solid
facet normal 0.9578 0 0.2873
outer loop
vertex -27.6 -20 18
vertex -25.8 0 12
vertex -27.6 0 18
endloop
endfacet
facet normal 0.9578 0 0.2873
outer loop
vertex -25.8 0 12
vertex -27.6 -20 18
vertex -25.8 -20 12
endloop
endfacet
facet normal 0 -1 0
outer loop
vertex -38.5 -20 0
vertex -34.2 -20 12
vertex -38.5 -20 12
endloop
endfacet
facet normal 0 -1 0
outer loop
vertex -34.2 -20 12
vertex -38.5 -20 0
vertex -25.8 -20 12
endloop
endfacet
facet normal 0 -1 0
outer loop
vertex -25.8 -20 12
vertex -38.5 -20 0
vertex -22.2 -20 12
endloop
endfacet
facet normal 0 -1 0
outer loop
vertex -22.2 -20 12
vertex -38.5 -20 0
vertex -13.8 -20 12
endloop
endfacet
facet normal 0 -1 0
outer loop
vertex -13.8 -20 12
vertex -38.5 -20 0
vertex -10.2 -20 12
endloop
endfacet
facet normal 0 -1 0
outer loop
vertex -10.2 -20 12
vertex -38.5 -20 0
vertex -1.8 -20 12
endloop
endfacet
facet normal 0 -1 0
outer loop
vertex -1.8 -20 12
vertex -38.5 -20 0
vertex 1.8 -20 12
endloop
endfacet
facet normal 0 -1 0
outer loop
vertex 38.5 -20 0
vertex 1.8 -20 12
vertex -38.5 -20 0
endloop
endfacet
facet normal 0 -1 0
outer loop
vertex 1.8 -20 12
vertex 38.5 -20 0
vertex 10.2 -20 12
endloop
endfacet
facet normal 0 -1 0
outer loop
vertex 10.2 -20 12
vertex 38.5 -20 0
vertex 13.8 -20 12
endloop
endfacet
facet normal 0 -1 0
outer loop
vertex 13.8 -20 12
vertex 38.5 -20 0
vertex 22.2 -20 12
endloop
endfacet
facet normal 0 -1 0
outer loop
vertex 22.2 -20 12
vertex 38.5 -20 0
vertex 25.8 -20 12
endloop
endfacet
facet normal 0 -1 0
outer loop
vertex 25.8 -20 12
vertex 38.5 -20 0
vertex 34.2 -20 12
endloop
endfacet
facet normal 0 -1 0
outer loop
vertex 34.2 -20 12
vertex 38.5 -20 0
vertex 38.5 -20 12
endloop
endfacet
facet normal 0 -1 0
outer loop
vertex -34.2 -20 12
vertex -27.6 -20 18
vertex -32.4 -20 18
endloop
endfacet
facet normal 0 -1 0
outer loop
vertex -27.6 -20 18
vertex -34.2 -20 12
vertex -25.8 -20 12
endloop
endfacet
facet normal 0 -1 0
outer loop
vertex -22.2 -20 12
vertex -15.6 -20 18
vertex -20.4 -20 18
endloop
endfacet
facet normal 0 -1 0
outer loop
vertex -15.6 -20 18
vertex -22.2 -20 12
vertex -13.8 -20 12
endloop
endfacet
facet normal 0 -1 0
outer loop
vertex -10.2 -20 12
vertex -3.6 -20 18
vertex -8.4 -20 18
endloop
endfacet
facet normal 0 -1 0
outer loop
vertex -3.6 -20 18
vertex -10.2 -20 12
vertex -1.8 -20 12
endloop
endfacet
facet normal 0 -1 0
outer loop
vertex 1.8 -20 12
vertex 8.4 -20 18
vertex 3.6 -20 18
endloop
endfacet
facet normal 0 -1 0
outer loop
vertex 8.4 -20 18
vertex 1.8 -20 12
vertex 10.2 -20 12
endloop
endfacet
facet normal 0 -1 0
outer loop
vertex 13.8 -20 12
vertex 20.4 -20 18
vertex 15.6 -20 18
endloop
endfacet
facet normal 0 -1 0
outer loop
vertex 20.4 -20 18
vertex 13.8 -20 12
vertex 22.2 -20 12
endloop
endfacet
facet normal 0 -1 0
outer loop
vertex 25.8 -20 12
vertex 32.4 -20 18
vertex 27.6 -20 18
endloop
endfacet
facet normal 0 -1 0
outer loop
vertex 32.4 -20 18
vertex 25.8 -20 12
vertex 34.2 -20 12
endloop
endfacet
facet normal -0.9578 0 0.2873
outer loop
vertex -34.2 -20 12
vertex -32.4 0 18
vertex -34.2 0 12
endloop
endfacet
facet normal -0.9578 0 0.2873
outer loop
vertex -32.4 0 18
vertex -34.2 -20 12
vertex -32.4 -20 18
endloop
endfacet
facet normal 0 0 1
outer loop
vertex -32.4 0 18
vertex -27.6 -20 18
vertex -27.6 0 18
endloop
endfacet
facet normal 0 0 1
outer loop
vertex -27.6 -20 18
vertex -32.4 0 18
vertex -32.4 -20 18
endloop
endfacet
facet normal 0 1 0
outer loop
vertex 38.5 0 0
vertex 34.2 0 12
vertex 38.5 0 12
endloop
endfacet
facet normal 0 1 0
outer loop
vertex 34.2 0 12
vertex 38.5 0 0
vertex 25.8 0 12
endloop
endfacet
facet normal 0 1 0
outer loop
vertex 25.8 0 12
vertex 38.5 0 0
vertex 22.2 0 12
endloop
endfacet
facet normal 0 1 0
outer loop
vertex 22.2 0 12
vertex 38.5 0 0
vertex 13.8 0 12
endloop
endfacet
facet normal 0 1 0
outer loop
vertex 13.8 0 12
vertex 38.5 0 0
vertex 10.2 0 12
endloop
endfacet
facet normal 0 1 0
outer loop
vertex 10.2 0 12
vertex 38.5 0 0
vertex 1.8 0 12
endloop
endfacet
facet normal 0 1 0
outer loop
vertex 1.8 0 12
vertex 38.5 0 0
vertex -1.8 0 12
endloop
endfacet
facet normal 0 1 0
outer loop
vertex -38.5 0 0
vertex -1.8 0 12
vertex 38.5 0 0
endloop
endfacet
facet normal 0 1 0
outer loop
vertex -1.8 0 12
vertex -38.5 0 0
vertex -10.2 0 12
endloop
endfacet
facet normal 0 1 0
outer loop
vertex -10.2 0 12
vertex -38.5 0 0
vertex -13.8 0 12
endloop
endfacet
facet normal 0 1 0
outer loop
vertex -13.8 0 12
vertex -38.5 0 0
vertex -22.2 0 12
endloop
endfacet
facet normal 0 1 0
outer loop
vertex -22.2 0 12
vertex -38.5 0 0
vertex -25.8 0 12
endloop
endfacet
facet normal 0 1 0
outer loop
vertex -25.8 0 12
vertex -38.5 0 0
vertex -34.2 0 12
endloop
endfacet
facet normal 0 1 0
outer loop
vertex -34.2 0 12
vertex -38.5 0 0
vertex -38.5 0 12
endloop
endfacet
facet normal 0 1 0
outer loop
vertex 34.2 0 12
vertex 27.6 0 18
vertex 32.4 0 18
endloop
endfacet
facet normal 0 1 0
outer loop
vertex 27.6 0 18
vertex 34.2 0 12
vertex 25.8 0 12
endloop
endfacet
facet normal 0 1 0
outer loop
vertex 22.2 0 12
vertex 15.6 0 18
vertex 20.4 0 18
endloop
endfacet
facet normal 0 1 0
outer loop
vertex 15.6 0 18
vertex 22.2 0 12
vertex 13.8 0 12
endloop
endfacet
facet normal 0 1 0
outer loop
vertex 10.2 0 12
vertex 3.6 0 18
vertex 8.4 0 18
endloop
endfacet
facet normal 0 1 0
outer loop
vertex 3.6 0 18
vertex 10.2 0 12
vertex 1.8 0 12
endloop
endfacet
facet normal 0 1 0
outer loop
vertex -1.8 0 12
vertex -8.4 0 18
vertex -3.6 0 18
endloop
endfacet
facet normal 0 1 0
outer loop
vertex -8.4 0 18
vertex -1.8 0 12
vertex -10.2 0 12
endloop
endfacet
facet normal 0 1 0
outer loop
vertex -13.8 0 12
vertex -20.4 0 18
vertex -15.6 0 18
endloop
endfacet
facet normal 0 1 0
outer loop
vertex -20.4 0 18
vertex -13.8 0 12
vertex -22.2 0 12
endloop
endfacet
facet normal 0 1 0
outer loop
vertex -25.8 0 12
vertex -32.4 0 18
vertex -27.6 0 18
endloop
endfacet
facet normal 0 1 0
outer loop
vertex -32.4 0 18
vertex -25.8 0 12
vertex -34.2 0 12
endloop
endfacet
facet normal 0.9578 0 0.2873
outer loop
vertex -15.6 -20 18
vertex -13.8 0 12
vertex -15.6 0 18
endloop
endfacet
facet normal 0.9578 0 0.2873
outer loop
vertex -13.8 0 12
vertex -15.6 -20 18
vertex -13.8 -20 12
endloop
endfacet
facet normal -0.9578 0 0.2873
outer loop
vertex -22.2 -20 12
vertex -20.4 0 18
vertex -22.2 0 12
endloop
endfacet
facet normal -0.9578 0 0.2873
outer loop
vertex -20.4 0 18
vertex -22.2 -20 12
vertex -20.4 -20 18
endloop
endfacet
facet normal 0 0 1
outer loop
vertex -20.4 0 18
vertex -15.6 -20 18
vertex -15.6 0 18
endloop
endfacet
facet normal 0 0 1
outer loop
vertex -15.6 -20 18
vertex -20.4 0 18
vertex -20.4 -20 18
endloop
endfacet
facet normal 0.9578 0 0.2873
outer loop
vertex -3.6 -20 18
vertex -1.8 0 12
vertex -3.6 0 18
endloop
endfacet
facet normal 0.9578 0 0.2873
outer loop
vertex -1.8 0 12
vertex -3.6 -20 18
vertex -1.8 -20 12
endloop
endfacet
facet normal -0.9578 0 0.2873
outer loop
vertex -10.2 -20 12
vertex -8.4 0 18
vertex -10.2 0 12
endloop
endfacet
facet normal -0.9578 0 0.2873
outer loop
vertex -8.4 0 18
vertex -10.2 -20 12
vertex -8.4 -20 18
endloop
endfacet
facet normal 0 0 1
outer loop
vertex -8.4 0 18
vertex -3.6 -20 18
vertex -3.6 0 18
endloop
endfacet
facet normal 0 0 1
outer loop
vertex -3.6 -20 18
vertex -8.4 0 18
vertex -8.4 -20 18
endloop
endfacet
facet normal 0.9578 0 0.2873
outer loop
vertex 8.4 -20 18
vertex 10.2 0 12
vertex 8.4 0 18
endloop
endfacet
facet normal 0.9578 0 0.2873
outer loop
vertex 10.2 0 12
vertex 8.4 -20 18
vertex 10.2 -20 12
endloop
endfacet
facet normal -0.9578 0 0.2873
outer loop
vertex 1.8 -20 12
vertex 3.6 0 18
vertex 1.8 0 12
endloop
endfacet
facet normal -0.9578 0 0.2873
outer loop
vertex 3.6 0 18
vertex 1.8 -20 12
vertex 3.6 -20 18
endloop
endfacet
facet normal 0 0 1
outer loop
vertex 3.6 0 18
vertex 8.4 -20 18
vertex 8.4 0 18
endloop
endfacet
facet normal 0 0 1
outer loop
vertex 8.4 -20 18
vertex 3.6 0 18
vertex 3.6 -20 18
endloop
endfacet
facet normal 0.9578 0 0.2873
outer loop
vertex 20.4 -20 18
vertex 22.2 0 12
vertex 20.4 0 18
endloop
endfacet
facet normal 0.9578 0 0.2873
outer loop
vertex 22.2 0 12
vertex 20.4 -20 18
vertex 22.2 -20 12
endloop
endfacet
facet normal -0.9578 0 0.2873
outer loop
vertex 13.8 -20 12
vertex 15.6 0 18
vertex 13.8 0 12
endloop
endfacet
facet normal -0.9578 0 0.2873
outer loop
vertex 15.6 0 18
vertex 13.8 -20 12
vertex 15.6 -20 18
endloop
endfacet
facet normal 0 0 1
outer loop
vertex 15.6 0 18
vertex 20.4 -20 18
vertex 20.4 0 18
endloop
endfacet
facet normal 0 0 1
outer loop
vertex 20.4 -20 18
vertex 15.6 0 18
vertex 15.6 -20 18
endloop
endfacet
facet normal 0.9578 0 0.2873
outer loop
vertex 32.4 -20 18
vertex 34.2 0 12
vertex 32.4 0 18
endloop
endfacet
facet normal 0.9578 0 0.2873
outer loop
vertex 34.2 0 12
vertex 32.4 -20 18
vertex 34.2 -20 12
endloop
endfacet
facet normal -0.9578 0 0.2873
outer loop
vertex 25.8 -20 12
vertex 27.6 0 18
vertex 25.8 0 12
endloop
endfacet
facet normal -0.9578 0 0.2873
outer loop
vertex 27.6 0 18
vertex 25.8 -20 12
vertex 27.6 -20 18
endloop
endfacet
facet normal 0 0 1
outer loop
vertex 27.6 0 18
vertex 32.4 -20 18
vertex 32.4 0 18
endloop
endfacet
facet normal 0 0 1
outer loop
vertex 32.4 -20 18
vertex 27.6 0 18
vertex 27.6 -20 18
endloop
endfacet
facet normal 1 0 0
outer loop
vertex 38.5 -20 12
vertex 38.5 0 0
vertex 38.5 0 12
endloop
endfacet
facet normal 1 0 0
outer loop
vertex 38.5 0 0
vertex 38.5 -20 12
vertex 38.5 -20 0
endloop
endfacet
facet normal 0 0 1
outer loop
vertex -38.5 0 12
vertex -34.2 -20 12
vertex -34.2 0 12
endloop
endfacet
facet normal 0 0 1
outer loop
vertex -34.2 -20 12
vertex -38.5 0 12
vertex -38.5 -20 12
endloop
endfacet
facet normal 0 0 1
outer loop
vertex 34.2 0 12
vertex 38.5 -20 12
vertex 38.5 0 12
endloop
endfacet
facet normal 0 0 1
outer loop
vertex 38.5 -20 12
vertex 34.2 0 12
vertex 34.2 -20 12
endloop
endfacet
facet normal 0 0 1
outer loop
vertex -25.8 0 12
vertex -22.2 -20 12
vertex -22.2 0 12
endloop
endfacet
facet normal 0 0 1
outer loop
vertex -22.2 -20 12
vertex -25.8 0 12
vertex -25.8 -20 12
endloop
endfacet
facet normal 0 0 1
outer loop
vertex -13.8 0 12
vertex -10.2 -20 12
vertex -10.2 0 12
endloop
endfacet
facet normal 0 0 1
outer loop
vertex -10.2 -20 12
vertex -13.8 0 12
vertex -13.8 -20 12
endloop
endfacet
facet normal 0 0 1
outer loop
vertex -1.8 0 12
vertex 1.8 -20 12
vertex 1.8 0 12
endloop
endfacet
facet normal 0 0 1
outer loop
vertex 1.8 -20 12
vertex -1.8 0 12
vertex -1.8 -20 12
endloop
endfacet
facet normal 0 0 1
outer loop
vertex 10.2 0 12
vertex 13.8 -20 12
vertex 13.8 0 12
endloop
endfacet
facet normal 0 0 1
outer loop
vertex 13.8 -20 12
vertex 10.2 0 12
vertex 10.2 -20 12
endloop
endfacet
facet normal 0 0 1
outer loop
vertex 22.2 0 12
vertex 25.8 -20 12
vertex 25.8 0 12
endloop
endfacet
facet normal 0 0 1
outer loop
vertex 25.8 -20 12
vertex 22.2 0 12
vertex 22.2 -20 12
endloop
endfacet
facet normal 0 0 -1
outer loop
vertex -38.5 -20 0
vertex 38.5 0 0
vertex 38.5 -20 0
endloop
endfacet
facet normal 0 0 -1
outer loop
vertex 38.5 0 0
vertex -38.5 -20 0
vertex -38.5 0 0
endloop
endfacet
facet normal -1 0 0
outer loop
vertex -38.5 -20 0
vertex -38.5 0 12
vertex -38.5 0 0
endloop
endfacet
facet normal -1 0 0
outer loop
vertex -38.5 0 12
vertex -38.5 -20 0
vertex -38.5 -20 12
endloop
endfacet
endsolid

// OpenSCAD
$fn = 32;

// ----------------------------------------------------------------------
// Toothed rack, 6 teeth
// 12 mm pitch, 6 mm teeth
// ----------------------------------------------------------------------

// --- parameters (mm) ---
bar_w = 20;      // bar width (Y)
seat_tol = 0.1;  // tolerance at the seating features
free_tol = 0.3;  // general tolerance on the free sizes
bar_h = 12;      // bar height (Z)
teeth = 6;       // number of teeth
pitch = 12;      // tooth pitch
tooth_h = 6;     // tooth height above the bar
root_w = 9;      // tooth width at the root
crest_w = 4.8;   // tooth width at the crest

// --- derived feature positions (mm) ---
span = (teeth - 1) * pitch;  // = 60   distance between the outer teeth
bar_l = span + root_w + 8;   // = 77   bar length: teeth plus 4 mm at each end
tooth_x = -span / 2;         // = -30   X of the first tooth
height = bar_h + tooth_h;    // = 18   overall height
feature_centers = [
  [tooth_x + 0 * pitch, -bar_w / 2],
  [tooth_x + 1 * pitch, -bar_w / 2],
  [tooth_x + 2 * pitch, -bar_w / 2],
  [tooth_x + 3 * pitch, -bar_w / 2],
  [tooth_x + 4 * pitch, -bar_w / 2],
  [tooth_x + 5 * pitch, -bar_w / 2]
];   // tooth centre line, drives the tooth loop

// bar with a rack of teeth, one extruded trapezoium per centre
module rack_tooth() {
  linear_extrude(height = bar_w)
    polygon(points = [
      [0, 0],
      [root_w, 0],
      [root_w / 2 + crest_w / 2, tooth_h + 1],
      [root_w / 2 - crest_w / 2, tooth_h + 1]
    ]);
}

union() {
  translate([-bar_l / 2, -bar_w, 0]) cube([bar_l, bar_w, bar_h]);
  for (centre = feature_centers)
    translate([centre[0] - root_w / 2, 0, bar_h - 1]) rotate([90, 0, 0]) rack_tooth();
}
